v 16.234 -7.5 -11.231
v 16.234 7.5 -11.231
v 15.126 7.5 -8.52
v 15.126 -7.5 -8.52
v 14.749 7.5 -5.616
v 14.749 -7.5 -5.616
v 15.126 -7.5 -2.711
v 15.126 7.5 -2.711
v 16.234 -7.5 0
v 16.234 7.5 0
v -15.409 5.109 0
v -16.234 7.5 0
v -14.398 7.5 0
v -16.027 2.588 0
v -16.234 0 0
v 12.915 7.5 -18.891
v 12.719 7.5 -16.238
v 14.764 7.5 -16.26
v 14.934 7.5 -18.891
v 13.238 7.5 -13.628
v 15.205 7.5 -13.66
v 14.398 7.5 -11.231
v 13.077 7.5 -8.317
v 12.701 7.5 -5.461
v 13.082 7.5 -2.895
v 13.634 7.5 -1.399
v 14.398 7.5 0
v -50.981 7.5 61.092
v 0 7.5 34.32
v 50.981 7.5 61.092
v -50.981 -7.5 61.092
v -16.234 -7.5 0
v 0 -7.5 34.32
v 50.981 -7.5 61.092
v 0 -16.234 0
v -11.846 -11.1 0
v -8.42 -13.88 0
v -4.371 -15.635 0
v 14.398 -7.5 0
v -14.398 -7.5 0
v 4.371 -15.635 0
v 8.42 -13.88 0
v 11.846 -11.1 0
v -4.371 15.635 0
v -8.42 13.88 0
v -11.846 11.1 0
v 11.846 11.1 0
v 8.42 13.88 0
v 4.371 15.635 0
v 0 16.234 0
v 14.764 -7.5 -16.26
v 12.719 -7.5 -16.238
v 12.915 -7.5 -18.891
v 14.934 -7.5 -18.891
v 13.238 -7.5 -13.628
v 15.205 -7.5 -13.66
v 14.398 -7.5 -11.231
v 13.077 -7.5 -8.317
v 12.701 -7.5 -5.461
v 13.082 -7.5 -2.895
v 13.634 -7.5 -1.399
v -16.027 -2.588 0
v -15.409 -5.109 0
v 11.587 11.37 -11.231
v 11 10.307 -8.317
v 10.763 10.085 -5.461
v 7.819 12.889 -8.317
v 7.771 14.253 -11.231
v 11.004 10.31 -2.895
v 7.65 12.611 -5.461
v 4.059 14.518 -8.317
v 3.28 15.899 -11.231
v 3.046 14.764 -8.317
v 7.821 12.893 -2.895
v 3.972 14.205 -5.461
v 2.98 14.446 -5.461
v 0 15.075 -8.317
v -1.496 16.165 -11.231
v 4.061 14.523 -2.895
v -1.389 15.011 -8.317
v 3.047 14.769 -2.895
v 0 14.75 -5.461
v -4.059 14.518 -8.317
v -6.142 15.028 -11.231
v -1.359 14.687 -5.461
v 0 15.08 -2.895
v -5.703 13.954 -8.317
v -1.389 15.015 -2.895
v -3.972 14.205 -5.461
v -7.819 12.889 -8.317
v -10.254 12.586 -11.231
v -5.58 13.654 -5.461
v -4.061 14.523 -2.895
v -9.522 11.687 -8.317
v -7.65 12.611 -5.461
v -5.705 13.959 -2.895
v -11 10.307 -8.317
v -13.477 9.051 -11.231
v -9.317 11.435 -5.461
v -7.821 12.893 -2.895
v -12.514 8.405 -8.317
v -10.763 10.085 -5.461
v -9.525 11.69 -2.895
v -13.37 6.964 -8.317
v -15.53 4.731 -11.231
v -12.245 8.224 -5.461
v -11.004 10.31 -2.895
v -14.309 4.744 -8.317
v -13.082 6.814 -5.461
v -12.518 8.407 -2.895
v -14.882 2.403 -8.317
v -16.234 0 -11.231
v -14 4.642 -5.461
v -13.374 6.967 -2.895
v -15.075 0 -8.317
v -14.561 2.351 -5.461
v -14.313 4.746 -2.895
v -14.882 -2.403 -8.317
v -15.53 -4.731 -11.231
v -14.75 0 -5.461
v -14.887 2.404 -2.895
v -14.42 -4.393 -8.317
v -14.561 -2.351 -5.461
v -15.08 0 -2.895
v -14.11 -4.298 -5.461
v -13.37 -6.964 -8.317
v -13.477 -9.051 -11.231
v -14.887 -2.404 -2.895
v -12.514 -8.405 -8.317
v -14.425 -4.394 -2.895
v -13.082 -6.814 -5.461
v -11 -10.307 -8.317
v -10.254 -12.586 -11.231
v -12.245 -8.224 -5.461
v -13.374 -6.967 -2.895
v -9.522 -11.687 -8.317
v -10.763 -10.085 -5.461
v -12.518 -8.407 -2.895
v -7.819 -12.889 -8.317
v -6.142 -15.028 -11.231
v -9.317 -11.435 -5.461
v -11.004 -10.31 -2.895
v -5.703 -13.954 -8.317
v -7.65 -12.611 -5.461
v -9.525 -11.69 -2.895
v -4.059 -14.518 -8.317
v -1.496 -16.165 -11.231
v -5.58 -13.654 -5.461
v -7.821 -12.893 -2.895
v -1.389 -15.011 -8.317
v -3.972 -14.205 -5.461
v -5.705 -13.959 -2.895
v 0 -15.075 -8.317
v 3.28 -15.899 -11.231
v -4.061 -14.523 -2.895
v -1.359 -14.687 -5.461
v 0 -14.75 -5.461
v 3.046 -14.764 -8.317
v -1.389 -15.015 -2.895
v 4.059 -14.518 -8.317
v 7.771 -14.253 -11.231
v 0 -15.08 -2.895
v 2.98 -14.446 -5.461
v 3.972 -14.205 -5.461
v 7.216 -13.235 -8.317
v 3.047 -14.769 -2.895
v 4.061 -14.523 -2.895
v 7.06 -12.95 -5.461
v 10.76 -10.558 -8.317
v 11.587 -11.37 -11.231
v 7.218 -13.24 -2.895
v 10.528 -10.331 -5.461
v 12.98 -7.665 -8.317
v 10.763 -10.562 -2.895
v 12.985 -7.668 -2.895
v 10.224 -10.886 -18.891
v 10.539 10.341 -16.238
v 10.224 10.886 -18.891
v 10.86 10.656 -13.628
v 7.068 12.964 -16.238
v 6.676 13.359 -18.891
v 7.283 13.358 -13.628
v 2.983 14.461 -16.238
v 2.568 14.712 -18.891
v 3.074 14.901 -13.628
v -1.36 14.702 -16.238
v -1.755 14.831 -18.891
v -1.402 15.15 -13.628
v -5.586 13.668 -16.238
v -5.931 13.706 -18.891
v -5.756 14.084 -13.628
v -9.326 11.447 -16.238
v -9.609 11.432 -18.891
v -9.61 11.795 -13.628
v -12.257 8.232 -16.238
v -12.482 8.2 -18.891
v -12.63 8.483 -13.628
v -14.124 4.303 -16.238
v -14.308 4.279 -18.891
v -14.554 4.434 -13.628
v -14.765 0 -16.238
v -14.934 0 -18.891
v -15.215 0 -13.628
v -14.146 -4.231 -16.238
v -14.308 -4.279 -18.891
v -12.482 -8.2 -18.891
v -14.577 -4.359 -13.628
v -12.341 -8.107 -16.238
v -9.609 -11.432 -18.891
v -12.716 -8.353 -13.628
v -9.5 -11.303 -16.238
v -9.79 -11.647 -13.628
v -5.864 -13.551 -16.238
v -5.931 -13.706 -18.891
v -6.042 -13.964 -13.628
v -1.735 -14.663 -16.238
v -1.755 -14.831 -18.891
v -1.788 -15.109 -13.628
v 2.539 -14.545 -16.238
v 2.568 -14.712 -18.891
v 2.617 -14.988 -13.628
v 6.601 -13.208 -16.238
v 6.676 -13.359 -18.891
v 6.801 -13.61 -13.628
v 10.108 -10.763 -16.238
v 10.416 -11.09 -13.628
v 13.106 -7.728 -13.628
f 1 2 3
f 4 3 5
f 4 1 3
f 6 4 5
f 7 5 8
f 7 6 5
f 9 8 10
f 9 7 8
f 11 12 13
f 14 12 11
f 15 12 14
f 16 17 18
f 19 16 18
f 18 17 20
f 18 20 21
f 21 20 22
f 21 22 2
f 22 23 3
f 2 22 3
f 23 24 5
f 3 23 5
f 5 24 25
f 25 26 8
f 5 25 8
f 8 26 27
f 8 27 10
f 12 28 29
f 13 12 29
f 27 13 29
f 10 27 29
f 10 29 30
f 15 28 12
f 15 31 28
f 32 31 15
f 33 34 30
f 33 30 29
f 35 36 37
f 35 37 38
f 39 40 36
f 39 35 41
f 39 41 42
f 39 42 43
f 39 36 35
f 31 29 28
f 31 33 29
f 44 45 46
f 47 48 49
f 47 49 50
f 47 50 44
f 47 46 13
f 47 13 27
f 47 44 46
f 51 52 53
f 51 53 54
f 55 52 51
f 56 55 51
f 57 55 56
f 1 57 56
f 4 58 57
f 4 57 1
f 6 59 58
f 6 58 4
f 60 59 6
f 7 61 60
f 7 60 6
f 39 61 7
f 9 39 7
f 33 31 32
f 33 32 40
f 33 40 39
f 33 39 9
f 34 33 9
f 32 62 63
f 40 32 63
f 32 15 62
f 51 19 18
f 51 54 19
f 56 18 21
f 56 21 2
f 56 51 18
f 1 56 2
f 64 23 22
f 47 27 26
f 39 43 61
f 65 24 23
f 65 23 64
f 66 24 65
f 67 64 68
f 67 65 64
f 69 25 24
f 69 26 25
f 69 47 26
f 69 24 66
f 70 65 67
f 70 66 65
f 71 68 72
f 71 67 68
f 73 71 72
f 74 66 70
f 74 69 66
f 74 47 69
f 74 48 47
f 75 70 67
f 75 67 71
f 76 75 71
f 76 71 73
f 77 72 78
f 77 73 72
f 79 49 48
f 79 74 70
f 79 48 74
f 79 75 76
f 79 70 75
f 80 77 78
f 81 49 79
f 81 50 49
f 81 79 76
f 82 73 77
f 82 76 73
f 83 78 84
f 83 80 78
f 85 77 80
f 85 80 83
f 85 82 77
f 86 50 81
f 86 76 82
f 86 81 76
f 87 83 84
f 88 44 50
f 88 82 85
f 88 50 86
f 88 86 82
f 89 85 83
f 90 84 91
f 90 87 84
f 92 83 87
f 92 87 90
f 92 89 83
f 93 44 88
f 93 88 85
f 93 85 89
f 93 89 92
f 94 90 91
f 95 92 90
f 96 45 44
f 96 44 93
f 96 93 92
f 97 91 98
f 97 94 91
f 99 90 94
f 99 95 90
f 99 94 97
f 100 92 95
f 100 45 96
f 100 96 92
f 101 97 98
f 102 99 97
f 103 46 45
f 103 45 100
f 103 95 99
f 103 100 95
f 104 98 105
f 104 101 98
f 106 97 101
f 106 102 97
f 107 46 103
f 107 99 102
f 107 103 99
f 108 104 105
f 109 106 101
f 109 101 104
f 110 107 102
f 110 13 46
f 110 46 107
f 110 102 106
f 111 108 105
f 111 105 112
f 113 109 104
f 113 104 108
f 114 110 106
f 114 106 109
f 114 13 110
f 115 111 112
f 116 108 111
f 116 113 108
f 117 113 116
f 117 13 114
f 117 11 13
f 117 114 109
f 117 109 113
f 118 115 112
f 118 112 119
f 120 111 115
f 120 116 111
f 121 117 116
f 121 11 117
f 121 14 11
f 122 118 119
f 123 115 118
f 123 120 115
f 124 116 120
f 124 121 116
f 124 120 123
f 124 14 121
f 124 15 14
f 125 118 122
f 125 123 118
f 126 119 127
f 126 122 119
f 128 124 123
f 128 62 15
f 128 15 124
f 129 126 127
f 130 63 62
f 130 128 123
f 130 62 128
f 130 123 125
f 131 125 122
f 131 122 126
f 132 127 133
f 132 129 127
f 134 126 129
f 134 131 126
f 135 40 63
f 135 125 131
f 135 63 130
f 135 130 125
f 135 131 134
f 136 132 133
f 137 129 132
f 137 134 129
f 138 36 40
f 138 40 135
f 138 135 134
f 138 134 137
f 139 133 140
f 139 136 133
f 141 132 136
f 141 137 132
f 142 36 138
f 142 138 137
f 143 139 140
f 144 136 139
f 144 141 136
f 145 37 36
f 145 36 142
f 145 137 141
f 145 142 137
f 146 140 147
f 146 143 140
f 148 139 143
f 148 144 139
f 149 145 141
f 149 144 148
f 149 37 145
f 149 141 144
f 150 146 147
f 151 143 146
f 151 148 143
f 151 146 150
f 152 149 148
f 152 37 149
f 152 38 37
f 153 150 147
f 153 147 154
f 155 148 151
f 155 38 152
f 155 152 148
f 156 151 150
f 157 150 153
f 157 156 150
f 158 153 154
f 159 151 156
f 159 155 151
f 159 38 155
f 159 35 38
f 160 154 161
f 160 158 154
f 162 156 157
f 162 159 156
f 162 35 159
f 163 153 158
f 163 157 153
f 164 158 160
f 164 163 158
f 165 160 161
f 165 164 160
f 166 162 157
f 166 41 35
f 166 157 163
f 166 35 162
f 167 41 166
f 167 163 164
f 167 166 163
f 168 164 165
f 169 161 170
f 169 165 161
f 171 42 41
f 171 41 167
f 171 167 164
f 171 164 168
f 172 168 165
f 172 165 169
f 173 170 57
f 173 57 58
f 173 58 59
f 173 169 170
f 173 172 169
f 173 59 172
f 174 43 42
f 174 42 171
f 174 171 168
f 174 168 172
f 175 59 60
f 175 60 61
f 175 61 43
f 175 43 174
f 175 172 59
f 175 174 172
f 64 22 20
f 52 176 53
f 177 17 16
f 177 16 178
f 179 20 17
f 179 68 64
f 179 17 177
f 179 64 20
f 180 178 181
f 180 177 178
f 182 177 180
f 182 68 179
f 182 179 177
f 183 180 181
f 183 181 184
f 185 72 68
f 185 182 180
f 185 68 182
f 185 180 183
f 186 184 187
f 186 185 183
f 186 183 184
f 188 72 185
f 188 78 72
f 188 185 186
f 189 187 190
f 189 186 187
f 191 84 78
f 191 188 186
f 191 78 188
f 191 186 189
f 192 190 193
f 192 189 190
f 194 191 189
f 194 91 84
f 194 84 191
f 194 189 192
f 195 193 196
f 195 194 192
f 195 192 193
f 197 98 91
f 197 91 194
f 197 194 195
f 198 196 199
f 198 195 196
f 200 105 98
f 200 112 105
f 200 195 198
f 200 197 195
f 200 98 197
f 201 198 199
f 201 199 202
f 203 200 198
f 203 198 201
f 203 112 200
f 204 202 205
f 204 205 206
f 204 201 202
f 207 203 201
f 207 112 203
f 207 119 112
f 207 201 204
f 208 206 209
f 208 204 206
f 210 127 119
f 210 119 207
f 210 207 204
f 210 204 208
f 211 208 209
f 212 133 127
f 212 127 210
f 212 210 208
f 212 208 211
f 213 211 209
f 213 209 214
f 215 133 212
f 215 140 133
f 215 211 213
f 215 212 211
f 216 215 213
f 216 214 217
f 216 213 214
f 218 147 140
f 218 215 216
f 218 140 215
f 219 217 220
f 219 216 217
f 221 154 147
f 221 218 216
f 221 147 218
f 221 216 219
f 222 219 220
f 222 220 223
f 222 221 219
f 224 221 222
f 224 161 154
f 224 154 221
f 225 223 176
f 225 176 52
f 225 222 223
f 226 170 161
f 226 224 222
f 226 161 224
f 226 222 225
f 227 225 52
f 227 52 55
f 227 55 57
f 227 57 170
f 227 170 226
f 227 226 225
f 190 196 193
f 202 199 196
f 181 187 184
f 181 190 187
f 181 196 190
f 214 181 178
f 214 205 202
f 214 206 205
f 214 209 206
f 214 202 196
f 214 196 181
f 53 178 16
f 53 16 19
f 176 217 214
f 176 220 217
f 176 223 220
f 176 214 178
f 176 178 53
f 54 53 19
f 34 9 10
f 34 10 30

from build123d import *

# Parameters (mm, degrees)
F2_DEPTH = 7.5


with BuildPart() as f1:
    # F0 (on Front) → F1 (revolve)
    with BuildSketch(Plane.XZ):
        with BuildLine():
            Line((16.234176, 0), (0, 0))
            Line((0, 0), (0, -18.89116))
            Line((0, -18.89116), (14.934336, -18.89116))
            ThreePointArc((14.934336, -18.89116), (14.908992, -14.946672), (16.234176, -11.231363))
            ThreePointArc((16.234176, -11.231363), (14.748893, -5.615682), (16.234176, 0))
        make_face()
    revolve(axis=Axis((0, 0, -9.44558), (0, 0, 1)))

    # F0 (on Front) → F2 (join, symmetric)
    with BuildSketch(Plane.XZ):
        Polygon((-16.234176, 0), (0, 0), (16.234176, 0), (50.981011, 61.091773), (0, 34.319621), (-50.981011, 61.091773), align=None)
        with BuildLine():
            Line((16.234176, 0), (0, 0))
            Line((0, 0), (0, -18.89116))
            Line((0, -18.89116), (14.934336, -18.89116))
            ThreePointArc((14.934336, -18.89116), (14.908992, -14.946672), (16.234176, -11.231363))
            ThreePointArc((16.234176, -11.231363), (14.748893, -5.615682), (16.234176, 0))
        make_face()
    extrude(amount=F2_DEPTH, both=True)


solid = f1.part
